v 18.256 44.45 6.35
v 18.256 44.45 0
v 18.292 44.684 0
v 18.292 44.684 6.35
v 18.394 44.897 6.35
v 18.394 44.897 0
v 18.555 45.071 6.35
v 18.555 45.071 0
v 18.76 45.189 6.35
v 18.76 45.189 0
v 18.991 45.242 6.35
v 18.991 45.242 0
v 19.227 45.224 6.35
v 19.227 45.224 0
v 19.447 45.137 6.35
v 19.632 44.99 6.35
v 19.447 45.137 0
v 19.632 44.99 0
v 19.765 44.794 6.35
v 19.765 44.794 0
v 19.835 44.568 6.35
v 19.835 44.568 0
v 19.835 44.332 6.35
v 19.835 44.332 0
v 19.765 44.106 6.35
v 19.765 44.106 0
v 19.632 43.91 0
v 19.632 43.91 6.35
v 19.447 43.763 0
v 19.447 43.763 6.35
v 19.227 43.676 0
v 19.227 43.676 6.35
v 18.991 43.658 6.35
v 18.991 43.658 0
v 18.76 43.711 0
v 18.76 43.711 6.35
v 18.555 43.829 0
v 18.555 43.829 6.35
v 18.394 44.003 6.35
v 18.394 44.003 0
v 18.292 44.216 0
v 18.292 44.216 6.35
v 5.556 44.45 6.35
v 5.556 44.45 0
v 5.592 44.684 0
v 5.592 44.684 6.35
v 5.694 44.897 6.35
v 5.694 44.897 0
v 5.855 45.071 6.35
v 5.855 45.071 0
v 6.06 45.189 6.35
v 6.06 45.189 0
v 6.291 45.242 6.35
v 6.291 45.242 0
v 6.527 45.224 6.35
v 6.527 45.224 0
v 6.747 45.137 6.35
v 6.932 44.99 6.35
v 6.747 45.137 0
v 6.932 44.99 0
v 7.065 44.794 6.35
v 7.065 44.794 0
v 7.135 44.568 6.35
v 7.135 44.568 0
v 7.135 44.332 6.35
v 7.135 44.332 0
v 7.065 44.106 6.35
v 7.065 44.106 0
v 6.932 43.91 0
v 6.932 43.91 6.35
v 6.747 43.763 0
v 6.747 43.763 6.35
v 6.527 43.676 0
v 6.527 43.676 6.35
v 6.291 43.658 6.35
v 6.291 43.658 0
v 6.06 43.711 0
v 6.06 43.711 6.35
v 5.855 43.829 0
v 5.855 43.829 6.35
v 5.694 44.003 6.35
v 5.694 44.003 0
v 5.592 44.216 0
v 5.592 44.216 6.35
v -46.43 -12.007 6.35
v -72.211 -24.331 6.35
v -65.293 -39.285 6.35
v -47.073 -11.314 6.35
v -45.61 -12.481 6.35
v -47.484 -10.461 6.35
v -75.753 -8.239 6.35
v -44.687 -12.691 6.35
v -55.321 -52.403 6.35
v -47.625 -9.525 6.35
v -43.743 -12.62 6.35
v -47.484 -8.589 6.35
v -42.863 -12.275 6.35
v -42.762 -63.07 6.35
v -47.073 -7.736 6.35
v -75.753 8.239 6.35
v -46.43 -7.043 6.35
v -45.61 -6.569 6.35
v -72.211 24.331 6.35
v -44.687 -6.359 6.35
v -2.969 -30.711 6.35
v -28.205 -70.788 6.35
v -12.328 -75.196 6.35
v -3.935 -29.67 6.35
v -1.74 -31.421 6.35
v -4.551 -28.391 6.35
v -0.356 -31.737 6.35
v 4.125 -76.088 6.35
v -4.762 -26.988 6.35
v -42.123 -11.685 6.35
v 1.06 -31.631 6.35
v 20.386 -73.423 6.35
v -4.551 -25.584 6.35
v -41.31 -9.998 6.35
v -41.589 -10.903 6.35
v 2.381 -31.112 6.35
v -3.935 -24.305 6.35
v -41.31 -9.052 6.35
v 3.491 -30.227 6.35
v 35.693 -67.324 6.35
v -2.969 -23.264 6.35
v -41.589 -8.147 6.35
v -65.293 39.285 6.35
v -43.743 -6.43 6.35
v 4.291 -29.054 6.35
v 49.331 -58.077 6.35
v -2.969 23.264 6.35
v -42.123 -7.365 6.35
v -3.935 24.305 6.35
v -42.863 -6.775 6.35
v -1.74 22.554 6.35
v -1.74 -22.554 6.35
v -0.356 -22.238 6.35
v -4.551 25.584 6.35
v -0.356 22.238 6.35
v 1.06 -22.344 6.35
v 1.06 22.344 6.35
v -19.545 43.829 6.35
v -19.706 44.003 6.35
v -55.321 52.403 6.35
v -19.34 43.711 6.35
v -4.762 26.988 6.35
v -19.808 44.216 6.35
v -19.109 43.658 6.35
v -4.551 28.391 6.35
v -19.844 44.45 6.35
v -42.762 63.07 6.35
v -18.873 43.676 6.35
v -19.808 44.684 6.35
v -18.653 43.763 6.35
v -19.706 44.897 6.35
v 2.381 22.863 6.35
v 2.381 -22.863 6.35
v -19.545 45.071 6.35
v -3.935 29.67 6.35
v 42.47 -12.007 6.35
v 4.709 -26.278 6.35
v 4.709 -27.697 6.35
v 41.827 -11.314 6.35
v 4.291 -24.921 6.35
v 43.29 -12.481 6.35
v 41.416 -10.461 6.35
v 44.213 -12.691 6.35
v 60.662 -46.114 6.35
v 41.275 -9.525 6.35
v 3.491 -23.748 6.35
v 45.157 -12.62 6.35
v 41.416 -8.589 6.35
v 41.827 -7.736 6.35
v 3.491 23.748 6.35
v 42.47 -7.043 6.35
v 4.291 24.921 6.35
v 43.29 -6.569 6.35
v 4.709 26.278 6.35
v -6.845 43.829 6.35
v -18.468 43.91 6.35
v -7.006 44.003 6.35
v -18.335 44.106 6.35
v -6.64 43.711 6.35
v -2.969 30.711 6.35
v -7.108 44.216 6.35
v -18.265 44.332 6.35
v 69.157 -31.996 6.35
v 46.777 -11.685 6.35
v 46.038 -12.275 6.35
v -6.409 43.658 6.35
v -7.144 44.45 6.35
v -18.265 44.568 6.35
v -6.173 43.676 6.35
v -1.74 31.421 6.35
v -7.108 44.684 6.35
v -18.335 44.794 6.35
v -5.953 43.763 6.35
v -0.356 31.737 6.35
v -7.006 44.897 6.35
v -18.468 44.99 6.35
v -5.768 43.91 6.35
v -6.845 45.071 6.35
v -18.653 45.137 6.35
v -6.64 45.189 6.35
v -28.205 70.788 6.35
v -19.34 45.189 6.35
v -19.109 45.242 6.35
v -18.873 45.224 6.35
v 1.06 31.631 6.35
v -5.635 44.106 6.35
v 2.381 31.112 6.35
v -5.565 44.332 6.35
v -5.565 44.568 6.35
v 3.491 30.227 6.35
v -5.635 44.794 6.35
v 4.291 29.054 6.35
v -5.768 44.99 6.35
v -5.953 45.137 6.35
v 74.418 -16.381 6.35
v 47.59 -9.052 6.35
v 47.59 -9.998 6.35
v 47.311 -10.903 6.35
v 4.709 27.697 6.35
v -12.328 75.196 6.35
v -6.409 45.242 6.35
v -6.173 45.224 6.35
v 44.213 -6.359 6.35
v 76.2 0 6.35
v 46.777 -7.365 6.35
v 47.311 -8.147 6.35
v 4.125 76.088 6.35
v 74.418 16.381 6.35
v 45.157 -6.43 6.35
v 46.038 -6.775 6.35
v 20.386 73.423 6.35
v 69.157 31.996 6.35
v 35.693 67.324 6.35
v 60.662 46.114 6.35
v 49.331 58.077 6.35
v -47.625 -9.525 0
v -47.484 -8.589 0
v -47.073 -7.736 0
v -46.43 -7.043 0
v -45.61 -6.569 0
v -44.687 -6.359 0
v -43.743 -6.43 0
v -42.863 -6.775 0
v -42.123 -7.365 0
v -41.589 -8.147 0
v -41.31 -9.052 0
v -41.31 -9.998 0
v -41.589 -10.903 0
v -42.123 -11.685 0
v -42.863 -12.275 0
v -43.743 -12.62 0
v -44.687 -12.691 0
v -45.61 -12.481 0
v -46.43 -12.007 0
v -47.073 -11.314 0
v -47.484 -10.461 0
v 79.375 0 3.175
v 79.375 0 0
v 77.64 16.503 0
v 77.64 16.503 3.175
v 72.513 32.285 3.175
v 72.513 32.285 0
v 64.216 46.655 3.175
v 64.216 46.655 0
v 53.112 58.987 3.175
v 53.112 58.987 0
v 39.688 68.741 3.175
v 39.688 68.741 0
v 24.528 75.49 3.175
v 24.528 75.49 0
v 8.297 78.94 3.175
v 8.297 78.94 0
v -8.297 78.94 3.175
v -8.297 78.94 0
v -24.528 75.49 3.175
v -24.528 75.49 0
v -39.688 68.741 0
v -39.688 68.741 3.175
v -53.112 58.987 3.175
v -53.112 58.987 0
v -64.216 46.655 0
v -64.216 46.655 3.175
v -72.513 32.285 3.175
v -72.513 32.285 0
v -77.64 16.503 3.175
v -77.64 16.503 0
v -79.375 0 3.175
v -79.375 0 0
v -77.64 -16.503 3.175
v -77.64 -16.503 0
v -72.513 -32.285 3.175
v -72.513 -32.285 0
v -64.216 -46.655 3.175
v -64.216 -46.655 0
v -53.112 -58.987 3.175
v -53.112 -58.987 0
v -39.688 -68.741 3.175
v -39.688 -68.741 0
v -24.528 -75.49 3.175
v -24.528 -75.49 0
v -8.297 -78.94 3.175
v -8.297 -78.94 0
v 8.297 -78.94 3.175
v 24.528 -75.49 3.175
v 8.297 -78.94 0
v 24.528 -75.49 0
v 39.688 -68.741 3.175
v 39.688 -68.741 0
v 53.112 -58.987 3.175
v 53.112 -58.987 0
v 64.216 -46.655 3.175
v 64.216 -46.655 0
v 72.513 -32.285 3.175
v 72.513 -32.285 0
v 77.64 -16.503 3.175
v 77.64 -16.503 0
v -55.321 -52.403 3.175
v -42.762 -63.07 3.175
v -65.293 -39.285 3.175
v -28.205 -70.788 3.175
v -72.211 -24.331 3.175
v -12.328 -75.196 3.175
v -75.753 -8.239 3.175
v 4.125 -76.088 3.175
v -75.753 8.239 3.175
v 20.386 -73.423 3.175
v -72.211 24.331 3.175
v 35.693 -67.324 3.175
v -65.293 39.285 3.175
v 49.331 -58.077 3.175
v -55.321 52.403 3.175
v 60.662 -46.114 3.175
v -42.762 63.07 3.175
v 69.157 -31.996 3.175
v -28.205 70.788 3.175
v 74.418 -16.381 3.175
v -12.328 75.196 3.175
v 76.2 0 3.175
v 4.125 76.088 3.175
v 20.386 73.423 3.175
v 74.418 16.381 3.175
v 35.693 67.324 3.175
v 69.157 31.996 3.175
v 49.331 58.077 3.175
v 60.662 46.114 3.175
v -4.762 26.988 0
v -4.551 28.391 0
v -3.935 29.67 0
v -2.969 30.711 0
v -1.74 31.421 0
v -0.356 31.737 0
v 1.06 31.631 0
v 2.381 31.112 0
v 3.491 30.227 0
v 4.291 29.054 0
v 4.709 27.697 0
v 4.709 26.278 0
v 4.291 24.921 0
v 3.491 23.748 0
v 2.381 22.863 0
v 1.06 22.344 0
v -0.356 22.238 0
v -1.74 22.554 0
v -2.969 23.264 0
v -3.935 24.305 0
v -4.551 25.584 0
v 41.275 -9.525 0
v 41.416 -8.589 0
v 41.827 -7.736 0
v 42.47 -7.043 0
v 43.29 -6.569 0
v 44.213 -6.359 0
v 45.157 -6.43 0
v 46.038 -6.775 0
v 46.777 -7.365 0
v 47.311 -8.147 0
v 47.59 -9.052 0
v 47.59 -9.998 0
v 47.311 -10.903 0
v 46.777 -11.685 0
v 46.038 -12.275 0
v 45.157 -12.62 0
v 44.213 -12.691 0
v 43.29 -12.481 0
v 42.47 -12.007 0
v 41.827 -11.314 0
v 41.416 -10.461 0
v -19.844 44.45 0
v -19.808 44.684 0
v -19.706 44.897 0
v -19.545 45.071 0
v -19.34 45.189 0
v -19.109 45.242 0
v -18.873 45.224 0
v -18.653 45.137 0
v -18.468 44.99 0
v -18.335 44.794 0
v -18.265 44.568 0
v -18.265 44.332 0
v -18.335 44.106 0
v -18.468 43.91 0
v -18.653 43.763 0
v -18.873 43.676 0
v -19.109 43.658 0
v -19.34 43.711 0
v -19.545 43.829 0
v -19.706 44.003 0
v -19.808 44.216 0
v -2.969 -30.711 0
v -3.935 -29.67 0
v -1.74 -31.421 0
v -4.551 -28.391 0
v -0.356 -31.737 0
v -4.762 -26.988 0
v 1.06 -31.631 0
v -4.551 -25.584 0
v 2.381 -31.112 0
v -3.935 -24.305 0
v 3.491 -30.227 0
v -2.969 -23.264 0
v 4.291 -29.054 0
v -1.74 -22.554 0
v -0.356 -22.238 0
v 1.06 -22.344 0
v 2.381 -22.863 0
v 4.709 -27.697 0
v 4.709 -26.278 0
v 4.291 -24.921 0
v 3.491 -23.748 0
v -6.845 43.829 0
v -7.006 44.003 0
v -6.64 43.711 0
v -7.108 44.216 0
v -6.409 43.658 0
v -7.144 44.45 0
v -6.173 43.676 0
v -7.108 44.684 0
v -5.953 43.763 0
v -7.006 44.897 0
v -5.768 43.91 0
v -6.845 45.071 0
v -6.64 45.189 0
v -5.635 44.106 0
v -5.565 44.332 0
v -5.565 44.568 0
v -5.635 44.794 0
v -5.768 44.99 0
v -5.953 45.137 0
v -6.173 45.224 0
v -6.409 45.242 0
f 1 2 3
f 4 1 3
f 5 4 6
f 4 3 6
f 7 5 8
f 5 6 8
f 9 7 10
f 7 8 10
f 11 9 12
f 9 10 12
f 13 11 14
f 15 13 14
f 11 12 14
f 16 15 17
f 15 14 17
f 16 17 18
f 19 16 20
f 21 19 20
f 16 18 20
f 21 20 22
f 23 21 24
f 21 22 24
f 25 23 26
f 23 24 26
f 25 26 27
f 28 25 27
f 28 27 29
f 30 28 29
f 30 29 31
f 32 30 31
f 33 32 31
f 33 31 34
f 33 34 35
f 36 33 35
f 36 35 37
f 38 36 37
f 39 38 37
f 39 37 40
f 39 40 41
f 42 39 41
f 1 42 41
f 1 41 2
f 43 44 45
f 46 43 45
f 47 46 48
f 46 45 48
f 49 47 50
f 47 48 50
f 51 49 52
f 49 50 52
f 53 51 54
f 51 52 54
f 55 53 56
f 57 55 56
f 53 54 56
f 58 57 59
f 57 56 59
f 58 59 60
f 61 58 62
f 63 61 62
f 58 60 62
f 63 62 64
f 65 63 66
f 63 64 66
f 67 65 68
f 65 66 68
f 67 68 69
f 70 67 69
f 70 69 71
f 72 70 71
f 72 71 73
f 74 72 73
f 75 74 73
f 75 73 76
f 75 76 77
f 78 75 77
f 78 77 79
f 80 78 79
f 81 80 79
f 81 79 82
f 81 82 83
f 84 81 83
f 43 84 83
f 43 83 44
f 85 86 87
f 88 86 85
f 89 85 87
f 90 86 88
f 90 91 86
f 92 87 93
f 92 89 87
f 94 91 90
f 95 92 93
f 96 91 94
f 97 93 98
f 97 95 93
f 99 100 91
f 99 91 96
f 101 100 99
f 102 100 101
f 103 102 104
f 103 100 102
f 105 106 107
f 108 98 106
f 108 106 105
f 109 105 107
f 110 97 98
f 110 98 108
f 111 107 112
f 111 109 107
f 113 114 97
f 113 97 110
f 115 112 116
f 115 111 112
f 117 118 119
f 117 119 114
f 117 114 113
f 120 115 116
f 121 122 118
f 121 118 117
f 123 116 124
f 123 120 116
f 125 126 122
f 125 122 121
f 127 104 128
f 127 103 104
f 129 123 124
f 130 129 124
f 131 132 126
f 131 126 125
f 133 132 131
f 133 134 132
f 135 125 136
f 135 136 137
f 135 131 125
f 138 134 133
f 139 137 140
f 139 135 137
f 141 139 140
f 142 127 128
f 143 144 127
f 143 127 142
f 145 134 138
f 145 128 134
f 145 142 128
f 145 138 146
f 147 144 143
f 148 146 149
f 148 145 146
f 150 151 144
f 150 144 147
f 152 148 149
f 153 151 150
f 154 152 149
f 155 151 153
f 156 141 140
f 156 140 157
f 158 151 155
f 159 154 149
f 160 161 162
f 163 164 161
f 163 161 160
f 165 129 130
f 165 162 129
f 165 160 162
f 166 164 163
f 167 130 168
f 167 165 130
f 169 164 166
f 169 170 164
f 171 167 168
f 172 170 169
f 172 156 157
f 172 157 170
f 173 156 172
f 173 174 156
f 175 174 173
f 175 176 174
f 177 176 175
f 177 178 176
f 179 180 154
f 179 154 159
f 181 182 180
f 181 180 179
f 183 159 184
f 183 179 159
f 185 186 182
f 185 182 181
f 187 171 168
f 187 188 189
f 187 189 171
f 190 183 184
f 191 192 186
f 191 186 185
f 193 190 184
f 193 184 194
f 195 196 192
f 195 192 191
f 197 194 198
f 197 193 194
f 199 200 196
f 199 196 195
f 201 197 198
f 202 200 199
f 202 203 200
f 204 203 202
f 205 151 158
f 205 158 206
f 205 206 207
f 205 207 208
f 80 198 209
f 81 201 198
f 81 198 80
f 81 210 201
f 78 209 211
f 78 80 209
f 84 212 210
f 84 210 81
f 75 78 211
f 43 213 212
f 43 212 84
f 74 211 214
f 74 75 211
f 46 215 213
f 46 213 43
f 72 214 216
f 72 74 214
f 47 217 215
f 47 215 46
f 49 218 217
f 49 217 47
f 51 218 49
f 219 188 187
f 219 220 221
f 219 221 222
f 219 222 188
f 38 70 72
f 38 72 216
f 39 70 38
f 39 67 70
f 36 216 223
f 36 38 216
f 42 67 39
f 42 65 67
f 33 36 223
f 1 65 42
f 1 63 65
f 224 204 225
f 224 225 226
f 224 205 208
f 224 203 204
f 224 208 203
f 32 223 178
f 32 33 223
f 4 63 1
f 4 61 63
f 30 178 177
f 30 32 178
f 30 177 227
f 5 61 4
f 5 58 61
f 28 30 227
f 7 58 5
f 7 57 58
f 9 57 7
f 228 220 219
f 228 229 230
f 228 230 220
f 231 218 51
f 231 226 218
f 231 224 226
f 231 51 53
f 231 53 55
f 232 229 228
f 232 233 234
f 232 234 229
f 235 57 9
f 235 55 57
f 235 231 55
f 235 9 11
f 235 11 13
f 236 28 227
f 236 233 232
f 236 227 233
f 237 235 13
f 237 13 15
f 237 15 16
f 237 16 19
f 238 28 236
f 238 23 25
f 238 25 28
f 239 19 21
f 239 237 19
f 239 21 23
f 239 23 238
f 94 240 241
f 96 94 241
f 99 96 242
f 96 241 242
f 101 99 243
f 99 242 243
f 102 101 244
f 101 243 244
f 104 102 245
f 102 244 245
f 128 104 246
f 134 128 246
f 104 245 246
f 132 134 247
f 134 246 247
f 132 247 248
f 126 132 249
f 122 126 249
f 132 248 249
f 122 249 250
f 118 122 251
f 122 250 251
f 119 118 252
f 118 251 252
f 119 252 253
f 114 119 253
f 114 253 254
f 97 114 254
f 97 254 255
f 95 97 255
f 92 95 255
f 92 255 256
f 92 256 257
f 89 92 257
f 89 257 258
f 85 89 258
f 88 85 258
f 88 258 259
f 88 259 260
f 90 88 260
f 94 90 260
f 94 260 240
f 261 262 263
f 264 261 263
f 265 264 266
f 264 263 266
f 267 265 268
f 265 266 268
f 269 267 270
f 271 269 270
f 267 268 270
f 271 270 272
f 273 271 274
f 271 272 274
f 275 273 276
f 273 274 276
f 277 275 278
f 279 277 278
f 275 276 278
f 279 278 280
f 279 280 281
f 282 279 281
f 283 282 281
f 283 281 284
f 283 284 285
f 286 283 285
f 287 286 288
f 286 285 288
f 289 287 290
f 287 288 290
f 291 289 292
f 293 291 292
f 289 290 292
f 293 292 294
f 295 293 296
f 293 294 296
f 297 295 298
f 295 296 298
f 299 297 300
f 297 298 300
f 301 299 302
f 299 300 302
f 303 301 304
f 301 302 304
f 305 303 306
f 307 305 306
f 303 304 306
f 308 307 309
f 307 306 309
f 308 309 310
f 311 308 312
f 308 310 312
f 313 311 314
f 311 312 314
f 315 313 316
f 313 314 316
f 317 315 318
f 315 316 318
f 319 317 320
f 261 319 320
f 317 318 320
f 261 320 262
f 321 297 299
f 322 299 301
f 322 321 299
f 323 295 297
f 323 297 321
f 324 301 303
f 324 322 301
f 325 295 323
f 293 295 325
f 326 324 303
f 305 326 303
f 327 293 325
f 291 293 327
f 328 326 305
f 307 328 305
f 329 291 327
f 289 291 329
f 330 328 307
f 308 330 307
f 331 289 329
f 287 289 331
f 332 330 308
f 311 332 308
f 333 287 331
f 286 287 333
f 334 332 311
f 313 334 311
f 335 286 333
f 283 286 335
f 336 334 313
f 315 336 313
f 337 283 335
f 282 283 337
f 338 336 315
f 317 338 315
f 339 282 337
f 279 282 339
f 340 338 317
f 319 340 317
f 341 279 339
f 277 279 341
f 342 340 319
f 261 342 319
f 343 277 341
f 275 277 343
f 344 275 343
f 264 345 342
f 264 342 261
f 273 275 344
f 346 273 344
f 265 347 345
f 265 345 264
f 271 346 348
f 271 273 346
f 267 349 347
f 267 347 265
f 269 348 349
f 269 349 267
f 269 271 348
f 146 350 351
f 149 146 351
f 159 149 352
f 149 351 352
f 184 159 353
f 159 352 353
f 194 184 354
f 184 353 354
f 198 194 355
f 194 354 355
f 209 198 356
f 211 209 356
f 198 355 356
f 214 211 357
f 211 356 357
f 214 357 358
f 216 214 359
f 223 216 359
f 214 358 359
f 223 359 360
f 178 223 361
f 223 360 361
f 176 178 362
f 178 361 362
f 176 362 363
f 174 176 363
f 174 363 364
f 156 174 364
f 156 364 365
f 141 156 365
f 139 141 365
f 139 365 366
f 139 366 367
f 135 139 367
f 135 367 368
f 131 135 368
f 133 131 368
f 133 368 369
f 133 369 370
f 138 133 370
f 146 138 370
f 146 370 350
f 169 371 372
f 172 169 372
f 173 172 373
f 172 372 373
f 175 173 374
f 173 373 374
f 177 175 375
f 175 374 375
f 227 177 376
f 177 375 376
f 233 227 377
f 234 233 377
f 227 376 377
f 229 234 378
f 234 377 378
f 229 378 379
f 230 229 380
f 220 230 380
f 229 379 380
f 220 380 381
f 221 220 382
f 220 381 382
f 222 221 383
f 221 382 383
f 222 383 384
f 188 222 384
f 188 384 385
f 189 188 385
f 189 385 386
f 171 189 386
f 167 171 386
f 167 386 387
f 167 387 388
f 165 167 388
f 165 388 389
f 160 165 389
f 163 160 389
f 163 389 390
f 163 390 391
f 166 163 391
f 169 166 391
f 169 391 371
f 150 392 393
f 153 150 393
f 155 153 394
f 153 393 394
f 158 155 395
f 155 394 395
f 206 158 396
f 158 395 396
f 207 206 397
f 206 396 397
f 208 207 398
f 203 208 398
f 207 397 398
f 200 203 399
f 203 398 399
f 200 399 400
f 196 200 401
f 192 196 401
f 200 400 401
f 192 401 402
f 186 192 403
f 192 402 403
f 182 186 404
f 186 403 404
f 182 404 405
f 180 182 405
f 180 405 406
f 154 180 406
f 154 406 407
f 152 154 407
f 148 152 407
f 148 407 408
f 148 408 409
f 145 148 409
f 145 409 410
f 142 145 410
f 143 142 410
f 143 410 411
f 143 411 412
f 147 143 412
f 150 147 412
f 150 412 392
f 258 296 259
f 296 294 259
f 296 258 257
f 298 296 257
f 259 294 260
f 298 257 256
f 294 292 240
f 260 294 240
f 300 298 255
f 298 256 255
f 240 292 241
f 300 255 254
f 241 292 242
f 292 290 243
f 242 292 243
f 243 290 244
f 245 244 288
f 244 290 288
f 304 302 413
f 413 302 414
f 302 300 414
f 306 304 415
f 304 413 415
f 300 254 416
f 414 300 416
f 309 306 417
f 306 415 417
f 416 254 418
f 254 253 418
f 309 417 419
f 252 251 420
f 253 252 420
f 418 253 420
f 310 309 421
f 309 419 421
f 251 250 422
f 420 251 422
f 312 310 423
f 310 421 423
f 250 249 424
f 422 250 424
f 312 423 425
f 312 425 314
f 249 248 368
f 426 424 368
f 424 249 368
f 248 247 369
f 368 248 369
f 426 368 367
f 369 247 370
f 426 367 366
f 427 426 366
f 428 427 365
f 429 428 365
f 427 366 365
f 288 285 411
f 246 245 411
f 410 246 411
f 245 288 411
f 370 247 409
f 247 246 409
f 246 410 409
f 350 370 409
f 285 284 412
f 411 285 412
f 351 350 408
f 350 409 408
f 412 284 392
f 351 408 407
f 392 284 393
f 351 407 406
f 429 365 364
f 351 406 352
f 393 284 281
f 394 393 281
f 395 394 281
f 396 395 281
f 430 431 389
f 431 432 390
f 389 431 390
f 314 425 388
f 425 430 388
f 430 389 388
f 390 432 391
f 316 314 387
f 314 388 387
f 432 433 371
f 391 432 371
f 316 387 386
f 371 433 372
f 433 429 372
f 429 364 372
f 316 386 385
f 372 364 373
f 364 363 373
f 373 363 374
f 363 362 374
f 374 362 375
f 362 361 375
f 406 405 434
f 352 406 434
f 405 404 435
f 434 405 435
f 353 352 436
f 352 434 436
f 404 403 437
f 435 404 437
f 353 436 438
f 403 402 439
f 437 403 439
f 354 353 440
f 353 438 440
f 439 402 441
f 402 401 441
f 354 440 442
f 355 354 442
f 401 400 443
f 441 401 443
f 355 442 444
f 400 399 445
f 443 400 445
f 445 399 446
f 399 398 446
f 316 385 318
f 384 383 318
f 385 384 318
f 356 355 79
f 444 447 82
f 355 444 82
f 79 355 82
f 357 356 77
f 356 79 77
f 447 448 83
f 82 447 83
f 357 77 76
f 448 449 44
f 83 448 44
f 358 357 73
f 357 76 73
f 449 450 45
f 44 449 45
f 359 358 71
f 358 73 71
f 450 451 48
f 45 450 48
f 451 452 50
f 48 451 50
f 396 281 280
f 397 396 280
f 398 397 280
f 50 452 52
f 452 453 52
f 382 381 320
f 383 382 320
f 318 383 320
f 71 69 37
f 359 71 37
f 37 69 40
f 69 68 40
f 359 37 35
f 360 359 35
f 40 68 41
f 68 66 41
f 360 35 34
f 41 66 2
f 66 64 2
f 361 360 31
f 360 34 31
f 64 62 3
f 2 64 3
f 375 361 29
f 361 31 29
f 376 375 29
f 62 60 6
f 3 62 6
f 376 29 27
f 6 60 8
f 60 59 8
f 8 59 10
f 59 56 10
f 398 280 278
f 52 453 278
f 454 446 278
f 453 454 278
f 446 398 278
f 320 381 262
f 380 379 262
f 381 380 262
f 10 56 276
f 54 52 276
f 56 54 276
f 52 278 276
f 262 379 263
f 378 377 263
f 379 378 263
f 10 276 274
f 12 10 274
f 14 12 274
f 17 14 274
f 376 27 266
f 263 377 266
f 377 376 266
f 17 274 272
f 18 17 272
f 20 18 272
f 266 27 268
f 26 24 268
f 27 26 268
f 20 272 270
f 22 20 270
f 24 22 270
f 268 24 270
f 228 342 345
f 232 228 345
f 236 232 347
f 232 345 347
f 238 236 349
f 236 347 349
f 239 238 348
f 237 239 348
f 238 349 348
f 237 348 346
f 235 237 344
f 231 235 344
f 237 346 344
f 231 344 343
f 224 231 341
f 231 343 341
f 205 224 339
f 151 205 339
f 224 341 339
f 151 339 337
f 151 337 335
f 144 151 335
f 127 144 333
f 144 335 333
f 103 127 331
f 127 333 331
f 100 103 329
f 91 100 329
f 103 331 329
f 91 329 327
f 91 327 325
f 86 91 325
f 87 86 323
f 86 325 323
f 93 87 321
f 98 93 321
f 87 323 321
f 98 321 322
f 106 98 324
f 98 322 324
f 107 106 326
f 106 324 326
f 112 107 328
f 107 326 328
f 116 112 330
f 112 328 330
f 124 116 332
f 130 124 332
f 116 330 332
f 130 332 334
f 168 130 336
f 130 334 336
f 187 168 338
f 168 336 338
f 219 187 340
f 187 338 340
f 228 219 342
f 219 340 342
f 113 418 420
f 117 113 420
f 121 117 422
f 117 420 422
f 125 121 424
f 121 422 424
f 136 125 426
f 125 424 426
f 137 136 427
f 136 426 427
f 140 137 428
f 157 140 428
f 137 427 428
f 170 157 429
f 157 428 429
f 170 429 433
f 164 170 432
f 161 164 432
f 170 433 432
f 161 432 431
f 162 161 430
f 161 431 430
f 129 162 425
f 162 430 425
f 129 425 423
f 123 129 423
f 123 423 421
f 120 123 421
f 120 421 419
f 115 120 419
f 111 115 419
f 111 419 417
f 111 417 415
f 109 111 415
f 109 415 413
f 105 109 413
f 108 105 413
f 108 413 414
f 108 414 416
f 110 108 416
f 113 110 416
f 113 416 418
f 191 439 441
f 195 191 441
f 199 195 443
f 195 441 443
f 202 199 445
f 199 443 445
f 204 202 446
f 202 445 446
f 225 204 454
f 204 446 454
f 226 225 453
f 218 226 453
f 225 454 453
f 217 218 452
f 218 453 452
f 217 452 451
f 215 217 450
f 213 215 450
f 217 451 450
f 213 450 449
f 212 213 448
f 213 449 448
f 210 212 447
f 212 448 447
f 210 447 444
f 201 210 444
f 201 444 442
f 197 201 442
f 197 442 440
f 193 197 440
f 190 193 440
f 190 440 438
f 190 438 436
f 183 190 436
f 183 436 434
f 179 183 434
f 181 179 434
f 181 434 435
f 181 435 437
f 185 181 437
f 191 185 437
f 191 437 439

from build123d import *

# Parameters (mm, degrees)
SKETCH1_R                      = 79.375
BOSS_EXTRUDE1_DEPTH            = 3.175
SKETCH2_R                      = 76.2
BOSS_EXTRUDE2_DEPTH            = 3.175
F_1_4_0_25_DIAMETER_HOLE1_D    = 6.35
F_1_16_0_0625_DIAMETER_HOLE1_D = 1.5875
F_3_8_0_375_DIAMETER_HOLE1_D   = 9.525


with BuildPart() as part:
    # Sketch1 → Boss-Extrude1 (new body)
    with BuildSketch(Plane.XY):
        Circle(SKETCH1_R)
    extrude(amount=BOSS_EXTRUDE1_DEPTH)

    # Sketch2 → Boss-Extrude2 (add)
    with BuildSketch(Plane.XY.offset(3.175)):
        Circle(SKETCH2_R)
    extrude(amount=BOSS_EXTRUDE2_DEPTH)

    # 1/4 (0.25) Diameter Hole1 (through all)
    with Locations(Plane.XY.offset(6.35)):
        with Locations((-44.45, -9.525), (44.45, -9.525)):
            Hole(F_1_4_0_25_DIAMETER_HOLE1_D / 2)

    # 1/16 (0.0625) Diameter Hole1 (through all)
    with Locations(Plane.XY.offset(6.35)):
        with Locations((-19.05, 44.45), (-6.35, 44.45), (6.35, 44.45), (19.05, 44.45)):
            Hole(F_1_16_0_0625_DIAMETER_HOLE1_D / 2)

    # 3/8 (0.375) Diameter Hole1 (through all)
    with Locations(Plane.XY.offset(6.35)):
        with Locations((0, -26.9875), (0, 26.9875)):
            Hole(F_3_8_0_375_DIAMETER_HOLE1_D / 2)


solid = part.part
